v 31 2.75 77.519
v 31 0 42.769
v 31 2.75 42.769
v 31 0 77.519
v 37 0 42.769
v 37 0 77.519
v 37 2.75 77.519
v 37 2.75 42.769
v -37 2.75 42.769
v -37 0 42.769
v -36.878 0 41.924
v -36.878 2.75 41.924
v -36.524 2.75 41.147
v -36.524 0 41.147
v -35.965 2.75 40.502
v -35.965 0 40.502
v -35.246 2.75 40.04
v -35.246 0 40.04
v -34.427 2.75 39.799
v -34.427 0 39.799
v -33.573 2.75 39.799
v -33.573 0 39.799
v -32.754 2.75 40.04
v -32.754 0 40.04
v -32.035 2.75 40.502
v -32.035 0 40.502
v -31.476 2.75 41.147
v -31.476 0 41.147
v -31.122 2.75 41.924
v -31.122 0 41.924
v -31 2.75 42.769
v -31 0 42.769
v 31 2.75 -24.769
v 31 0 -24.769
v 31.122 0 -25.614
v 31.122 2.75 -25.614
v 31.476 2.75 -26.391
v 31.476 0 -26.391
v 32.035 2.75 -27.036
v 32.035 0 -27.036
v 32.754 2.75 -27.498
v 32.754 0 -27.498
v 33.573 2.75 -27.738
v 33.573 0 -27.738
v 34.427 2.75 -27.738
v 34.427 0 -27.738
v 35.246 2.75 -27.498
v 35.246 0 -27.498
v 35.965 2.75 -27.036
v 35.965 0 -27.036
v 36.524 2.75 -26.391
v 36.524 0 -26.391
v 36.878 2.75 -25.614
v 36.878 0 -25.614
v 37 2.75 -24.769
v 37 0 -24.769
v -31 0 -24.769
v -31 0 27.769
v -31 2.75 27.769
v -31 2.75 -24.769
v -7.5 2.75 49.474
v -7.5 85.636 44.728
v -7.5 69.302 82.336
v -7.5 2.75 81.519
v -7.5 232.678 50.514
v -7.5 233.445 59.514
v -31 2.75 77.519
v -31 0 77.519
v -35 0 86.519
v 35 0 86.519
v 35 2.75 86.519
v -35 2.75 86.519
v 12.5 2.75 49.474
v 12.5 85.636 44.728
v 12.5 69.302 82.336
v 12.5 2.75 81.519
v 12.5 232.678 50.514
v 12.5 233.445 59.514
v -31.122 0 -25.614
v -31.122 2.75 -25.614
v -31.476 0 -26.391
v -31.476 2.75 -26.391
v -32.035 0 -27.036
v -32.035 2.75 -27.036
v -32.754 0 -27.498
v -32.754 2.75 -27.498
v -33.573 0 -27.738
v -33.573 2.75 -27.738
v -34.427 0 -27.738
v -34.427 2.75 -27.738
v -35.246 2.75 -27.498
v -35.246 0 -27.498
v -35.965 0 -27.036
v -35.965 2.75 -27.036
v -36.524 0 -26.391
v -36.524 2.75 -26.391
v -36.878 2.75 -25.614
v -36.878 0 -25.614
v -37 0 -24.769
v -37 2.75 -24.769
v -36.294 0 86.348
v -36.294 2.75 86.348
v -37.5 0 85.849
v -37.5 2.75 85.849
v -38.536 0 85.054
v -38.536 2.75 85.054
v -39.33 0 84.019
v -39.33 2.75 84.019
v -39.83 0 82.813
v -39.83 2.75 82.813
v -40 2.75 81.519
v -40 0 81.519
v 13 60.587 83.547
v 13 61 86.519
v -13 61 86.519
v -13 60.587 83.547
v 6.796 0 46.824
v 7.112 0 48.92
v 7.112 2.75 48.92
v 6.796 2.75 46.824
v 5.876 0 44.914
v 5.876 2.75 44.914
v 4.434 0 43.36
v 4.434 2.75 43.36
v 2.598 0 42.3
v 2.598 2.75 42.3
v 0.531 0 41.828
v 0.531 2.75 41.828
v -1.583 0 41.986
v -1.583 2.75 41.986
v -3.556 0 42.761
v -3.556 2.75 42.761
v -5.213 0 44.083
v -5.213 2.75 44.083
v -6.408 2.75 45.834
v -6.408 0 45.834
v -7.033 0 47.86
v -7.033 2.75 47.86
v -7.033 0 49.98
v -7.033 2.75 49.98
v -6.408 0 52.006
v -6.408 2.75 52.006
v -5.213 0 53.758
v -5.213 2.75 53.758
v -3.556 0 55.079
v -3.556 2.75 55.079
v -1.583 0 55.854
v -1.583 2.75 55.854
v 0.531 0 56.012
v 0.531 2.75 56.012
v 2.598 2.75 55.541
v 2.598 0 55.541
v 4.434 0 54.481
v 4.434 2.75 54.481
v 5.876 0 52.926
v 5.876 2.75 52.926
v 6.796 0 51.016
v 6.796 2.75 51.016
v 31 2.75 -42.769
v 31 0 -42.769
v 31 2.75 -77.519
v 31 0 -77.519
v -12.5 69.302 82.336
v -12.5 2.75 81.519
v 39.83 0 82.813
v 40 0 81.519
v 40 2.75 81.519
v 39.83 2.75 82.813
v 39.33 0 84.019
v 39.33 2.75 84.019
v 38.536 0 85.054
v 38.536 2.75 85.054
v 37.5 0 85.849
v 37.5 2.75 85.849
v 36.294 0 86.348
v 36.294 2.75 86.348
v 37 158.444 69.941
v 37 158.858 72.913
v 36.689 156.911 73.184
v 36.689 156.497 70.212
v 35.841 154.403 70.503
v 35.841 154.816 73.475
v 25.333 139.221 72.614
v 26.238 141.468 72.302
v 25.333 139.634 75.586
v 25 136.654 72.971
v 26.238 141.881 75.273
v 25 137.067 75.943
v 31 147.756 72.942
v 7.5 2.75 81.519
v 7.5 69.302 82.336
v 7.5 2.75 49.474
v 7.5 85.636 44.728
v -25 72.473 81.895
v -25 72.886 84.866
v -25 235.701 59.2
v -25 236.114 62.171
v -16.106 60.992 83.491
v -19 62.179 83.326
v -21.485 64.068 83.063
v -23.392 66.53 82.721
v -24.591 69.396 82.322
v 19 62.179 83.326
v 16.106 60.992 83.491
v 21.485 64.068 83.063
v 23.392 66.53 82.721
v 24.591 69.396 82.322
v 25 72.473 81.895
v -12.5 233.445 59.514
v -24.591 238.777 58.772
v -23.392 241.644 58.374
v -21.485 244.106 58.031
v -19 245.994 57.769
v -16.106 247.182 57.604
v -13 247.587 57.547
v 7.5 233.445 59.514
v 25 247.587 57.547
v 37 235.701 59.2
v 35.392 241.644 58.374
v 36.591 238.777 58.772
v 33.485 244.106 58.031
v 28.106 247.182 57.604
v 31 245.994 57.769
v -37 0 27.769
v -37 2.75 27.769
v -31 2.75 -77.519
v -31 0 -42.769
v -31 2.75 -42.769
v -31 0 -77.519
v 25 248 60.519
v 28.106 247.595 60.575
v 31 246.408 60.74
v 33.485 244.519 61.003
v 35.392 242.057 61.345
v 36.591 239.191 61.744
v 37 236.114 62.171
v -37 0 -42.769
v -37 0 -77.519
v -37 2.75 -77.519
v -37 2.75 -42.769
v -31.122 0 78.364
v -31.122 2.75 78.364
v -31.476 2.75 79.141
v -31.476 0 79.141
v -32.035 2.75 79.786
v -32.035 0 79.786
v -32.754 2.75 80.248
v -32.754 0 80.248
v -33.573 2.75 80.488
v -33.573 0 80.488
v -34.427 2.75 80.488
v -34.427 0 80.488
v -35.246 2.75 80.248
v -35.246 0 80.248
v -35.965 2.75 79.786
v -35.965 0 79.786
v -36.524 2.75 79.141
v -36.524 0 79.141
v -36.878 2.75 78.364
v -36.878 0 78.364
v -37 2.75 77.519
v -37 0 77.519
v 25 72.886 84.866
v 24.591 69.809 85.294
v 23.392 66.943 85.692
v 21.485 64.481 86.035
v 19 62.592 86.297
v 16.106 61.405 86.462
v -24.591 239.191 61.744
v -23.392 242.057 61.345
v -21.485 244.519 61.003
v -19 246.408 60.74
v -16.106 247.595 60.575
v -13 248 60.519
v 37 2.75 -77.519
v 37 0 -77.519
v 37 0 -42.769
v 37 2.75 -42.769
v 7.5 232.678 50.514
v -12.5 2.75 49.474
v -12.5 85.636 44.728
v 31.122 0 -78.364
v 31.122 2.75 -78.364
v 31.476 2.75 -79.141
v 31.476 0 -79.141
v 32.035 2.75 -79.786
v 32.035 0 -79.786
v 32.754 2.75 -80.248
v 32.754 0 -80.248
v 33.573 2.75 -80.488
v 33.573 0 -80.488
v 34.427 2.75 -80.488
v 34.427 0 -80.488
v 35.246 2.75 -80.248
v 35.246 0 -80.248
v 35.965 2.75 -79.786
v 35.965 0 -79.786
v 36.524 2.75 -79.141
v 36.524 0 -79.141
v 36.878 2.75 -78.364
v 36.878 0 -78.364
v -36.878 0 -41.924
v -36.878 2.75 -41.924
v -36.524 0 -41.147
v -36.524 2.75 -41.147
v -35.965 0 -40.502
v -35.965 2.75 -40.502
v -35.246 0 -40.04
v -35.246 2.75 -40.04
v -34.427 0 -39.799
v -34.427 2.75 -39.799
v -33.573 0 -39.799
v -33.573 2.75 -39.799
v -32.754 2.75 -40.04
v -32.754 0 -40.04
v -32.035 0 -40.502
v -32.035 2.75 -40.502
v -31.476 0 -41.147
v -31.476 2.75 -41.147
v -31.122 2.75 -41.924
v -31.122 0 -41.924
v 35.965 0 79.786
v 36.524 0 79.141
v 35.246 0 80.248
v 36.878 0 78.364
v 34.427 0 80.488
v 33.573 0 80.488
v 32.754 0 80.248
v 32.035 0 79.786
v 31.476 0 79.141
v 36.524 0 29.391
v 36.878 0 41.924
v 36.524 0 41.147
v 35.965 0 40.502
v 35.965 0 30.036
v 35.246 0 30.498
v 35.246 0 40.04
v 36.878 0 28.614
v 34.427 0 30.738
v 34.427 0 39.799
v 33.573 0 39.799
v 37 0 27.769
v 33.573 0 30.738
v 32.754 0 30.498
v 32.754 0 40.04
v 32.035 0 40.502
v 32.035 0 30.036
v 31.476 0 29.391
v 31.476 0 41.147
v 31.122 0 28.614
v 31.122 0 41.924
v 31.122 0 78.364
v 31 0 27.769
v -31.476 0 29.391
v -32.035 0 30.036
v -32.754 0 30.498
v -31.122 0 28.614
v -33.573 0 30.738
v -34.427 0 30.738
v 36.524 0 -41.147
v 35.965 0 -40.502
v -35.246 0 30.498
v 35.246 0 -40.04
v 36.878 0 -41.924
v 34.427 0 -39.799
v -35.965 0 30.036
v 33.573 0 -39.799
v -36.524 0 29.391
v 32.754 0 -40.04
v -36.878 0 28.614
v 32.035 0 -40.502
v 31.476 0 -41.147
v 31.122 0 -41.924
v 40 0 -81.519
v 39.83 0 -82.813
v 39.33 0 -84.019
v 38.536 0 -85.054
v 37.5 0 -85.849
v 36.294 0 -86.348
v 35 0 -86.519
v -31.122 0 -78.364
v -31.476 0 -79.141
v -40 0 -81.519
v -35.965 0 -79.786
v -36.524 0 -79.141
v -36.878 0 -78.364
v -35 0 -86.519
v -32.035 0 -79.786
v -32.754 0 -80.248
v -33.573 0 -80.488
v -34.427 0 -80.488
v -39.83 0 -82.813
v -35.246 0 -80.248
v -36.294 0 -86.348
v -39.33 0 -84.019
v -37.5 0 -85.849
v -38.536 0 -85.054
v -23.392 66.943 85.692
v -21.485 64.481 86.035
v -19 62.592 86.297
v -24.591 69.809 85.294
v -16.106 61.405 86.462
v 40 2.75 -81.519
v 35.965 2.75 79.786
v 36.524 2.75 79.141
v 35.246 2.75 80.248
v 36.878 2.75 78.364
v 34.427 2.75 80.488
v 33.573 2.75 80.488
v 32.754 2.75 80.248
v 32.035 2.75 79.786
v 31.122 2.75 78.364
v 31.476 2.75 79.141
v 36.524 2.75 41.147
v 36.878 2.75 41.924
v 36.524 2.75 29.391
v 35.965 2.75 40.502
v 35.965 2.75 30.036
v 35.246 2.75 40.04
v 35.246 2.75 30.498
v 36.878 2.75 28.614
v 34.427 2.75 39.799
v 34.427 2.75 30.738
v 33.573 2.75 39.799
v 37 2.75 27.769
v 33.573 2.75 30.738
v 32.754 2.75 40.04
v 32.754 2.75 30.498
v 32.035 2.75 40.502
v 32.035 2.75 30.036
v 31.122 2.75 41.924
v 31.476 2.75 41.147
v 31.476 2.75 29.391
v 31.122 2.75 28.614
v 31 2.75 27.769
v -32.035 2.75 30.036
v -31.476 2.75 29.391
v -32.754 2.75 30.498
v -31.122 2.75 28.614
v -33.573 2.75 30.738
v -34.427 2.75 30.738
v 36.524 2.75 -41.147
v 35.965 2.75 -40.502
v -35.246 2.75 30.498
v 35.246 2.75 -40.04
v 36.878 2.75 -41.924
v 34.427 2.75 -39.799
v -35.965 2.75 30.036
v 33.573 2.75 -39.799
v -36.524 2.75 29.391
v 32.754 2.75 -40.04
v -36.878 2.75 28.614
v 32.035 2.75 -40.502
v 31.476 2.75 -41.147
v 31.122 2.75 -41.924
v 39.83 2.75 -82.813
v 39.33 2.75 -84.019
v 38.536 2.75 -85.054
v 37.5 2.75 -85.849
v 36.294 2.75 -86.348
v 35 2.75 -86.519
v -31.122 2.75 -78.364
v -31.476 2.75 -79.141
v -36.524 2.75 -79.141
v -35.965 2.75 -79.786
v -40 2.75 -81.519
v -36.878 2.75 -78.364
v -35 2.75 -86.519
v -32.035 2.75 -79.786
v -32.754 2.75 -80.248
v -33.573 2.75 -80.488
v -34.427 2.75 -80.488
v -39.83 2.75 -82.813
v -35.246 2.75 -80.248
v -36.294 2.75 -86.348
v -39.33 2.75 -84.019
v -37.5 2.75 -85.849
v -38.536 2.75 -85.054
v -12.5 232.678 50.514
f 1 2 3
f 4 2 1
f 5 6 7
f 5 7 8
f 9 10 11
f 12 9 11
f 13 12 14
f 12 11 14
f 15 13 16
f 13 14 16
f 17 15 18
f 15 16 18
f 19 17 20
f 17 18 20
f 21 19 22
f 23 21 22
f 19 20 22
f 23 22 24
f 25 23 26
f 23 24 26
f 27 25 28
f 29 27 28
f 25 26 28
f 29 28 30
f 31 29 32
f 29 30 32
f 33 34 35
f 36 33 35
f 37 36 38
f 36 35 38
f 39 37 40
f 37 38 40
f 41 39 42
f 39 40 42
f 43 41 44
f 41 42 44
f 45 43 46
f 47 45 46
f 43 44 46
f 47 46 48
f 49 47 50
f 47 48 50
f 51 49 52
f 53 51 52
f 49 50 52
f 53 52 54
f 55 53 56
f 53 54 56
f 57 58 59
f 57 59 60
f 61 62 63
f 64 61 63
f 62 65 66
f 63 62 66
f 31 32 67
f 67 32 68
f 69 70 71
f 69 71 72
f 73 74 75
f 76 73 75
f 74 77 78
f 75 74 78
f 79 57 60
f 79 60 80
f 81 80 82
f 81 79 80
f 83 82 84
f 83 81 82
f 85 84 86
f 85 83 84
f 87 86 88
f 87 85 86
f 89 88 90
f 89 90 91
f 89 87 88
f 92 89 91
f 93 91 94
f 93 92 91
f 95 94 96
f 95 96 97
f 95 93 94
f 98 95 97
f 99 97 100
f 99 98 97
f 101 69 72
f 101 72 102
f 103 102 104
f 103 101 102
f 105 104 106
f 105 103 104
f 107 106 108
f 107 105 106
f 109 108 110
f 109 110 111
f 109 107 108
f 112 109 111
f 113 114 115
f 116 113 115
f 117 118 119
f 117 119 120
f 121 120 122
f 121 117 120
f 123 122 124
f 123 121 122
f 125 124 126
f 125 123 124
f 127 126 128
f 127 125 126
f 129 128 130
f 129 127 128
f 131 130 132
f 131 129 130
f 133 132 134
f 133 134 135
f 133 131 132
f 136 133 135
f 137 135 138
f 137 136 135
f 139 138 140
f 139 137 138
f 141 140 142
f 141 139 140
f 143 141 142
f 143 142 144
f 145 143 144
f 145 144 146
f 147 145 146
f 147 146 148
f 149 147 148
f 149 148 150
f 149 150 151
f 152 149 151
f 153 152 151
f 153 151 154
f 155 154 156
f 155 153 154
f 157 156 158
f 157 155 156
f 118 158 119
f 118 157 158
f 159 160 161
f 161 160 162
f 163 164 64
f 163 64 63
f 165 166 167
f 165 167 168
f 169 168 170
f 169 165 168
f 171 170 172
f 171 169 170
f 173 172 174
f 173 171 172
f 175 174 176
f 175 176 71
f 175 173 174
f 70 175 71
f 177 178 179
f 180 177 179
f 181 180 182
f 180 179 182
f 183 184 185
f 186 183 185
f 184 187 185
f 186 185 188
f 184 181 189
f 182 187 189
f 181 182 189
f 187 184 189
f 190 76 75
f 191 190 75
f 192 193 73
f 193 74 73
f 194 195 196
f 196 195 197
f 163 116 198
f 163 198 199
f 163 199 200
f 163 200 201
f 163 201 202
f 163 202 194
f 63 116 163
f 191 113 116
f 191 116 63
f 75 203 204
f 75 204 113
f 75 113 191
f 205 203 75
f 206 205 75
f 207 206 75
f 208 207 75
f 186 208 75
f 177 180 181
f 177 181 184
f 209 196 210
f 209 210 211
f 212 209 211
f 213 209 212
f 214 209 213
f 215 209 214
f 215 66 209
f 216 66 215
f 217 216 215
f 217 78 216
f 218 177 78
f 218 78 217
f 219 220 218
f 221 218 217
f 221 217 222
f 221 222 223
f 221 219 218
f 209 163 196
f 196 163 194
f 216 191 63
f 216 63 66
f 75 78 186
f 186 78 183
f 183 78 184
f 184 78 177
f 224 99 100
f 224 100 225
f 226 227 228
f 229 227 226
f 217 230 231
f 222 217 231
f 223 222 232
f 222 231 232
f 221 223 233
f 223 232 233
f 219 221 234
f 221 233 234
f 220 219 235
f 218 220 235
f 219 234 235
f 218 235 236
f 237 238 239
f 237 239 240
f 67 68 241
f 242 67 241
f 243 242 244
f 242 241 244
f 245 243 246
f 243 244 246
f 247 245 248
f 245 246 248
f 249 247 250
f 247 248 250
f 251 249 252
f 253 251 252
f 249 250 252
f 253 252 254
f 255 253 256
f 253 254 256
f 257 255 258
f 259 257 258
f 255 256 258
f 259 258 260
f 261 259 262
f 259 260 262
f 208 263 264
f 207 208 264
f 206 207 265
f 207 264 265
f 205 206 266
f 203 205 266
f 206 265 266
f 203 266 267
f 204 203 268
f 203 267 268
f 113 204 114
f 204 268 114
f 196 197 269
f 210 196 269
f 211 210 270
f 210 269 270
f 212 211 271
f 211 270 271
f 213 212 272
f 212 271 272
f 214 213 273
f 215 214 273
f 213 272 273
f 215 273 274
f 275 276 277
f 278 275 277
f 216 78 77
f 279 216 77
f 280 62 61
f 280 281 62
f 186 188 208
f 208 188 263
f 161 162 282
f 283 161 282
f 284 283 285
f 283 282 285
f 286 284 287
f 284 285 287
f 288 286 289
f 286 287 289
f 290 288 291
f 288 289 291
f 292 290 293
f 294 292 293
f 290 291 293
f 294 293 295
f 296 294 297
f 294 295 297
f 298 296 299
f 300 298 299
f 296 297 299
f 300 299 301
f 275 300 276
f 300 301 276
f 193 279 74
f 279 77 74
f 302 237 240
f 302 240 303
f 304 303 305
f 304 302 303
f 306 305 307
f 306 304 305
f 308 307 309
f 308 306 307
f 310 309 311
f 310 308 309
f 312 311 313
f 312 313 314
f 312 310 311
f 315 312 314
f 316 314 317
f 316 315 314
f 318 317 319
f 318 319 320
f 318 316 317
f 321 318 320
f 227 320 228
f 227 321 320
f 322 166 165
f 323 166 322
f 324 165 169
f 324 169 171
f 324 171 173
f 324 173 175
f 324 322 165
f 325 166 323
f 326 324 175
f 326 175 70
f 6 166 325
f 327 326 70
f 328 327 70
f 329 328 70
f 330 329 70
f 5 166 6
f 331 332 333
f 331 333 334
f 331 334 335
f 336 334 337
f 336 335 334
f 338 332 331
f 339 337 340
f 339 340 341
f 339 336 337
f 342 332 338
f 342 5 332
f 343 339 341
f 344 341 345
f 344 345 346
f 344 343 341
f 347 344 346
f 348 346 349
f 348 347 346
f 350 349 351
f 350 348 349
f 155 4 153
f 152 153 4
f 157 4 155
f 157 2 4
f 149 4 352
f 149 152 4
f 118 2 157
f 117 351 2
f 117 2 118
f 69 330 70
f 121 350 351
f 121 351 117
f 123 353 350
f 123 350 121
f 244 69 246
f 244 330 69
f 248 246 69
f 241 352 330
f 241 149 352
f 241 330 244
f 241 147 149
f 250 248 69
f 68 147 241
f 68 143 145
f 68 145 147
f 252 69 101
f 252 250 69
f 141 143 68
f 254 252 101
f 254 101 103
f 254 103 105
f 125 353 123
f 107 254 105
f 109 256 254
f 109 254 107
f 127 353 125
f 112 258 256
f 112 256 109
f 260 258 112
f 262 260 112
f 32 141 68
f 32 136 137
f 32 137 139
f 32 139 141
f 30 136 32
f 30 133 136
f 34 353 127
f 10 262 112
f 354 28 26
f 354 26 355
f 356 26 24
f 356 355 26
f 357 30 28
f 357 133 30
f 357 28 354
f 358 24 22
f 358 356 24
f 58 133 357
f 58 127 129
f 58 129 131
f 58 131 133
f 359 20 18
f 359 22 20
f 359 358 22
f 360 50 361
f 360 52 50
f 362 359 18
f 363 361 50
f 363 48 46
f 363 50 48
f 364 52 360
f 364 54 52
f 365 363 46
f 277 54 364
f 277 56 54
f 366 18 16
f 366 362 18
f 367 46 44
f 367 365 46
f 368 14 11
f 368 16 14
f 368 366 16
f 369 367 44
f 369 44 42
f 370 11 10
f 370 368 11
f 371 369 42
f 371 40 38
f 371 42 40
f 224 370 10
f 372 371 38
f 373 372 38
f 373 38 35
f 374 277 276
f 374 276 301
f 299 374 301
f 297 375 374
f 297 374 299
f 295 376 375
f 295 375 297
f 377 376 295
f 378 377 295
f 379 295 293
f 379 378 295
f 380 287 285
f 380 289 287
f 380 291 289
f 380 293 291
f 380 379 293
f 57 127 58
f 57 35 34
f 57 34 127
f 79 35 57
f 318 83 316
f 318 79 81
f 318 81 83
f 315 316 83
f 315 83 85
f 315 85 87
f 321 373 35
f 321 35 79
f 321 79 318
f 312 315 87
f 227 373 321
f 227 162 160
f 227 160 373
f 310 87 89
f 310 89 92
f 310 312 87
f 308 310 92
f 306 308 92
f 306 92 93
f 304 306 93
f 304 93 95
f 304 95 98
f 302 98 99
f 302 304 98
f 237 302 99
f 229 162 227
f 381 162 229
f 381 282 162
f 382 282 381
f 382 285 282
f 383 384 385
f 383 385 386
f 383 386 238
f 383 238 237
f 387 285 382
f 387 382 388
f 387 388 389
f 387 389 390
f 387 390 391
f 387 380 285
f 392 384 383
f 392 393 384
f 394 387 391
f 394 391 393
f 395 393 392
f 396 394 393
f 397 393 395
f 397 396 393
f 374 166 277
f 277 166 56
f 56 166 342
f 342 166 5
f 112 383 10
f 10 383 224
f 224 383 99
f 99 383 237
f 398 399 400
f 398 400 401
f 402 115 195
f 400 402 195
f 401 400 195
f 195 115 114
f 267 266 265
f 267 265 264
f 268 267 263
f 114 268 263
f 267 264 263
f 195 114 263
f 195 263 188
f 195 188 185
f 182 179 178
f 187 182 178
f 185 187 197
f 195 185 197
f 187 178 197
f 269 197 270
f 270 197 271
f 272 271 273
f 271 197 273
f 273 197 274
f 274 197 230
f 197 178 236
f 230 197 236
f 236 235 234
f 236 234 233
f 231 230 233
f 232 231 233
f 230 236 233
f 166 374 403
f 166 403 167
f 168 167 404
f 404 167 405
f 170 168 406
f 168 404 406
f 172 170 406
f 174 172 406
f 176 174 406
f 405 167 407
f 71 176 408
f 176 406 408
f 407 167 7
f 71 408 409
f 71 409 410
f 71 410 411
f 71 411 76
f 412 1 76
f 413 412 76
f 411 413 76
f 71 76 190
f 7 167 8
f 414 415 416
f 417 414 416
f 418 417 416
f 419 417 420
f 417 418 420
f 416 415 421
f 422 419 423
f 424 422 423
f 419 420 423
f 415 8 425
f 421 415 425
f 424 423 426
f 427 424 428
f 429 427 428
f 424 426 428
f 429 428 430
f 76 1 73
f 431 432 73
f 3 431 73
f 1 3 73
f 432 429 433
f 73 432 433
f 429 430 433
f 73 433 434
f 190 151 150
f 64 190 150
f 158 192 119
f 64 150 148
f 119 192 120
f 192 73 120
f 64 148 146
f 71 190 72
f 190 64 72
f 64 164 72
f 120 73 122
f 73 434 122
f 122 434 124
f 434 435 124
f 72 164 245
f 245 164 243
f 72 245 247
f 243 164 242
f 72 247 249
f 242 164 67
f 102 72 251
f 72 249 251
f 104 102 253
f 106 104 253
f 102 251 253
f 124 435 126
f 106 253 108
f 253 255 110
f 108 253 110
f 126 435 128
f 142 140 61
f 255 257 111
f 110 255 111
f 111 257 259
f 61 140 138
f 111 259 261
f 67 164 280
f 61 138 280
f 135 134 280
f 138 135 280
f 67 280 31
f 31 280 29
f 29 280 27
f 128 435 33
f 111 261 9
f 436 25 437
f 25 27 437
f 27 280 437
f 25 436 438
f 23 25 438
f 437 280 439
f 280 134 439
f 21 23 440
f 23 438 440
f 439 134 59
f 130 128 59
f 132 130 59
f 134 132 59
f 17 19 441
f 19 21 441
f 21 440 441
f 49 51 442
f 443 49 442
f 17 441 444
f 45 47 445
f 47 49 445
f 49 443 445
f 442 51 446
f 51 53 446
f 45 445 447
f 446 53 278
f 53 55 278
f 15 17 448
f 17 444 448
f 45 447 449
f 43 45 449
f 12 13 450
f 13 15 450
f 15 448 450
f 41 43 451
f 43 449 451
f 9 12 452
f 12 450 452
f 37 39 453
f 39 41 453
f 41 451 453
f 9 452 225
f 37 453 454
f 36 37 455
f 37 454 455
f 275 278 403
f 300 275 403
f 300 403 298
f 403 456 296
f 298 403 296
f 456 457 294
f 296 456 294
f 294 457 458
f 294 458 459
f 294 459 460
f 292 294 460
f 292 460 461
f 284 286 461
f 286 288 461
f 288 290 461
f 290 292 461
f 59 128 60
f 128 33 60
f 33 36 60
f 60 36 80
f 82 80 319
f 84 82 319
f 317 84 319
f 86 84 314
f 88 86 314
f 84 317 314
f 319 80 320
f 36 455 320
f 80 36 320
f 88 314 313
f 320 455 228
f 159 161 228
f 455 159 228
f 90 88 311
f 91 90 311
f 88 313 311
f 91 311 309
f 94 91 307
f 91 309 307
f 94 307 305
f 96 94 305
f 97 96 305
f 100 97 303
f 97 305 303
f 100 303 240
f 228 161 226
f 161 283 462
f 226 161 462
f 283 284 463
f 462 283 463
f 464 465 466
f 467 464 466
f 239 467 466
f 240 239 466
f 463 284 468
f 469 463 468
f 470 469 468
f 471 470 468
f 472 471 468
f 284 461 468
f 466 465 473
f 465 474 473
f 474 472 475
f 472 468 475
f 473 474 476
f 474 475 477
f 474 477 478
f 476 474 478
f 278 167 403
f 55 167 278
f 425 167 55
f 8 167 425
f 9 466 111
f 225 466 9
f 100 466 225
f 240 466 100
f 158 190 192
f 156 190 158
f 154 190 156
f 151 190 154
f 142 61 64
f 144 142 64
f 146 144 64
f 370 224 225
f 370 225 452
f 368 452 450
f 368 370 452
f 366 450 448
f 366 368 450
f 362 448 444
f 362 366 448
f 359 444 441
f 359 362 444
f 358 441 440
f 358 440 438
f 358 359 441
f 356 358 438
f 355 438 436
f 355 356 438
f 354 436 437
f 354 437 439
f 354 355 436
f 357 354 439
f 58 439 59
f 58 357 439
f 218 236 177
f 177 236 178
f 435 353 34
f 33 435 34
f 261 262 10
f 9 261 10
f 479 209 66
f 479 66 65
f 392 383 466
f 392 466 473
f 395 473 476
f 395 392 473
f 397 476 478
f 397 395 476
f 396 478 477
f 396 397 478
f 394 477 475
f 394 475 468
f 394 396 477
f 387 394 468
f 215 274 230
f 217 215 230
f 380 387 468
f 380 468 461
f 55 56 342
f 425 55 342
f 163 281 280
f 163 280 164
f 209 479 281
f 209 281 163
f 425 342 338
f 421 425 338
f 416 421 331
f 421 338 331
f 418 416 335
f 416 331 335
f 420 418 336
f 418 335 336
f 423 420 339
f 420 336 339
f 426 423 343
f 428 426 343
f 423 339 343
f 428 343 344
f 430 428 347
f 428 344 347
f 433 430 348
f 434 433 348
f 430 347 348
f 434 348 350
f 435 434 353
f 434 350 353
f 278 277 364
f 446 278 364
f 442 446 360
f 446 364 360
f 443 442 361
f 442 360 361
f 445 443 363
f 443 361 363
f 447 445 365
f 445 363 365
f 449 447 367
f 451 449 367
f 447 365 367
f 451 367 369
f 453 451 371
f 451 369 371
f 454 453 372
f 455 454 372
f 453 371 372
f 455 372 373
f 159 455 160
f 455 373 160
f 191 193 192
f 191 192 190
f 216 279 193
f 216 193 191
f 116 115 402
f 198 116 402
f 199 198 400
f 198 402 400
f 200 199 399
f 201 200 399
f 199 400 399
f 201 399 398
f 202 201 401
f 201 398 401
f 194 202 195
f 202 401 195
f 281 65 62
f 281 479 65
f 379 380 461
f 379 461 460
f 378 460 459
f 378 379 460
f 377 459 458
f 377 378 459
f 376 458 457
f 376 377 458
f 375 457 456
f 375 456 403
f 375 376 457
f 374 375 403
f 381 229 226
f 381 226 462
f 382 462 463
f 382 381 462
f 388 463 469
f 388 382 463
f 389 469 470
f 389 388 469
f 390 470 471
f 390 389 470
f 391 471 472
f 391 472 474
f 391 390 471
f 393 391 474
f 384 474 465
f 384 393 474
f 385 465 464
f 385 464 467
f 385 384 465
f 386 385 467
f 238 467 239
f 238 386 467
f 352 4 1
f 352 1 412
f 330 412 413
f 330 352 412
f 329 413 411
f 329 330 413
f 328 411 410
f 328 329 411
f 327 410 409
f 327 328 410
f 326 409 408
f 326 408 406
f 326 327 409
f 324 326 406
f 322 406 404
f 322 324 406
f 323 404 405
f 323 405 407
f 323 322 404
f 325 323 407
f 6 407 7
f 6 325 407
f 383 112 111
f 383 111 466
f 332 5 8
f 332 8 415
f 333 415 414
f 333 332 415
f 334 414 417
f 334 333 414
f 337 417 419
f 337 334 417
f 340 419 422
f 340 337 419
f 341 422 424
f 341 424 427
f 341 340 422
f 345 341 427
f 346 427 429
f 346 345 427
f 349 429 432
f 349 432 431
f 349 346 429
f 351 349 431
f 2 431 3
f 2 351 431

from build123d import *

# Parameters (mm, degrees)
SKETCH1_R           = 7.112045721
BOSS_EXTRUDE1_DEPTH = 2.75
BOSS_EXTRUDE2_DEPTH = 3
BOSS_EXTRUDE3_DEPTH = 2.5


with BuildPart() as part:
    # Sketch1 → Boss-Extrude1 (new body)
    with BuildSketch(Plane(origin=(0, 0, 0), x_dir=(1, 0, 0), z_dir=(0, 1, 0))):
        with BuildLine():
            Line((-35, 86.51875), (35, 86.51875))
            ThreePointArc((35, 86.51875), (38.535533906, 85.054283906), (40, 81.51875))
            Line((40, 81.51875), (40, -81.51875))
            ThreePointArc((40, -81.51875), (38.535533906, -85.054283906), (35, -86.51875))
            Line((35, -86.51875), (-35, -86.51875))
            ThreePointArc((-35, -86.51875), (-38.535533906, -85.054283906), (-40, -81.51875))
            Line((-40, -81.51875), (-40, 81.51875))
            ThreePointArc((-40, 81.51875), (-38.535533906, 85.054283906), (-35, 86.51875))
        make_face()
        with Locations((0, -48.920084539)):
            Circle(SKETCH1_R, mode=Mode.SUBTRACT)
        with BuildLine():
            Line((37, 77.51875), (37, 42.76875))
            ThreePointArc((37, 42.76875), (34, 39.76875), (31, 42.76875))
            Line((31, 42.76875), (31, 77.51875))
            ThreePointArc((31, 77.51875), (34, 80.51875), (37, 77.51875))
        make_face(mode=Mode.SUBTRACT)
        with BuildLine():
            Line((-37, 77.51875), (-37, 42.76875))
            ThreePointArc((-37, 42.76875), (-34, 39.76875), (-31, 42.76875))
            Line((-31, 42.76875), (-31, 77.51875))
            ThreePointArc((-31, 77.51875), (-34, 80.51875), (-37, 77.51875))
        make_face(mode=Mode.SUBTRACT)
        with BuildLine():
            Line((37, -77.51875), (37, -42.76875))
            ThreePointArc((37, -42.76875), (34, -39.76875), (31, -42.76875))
            Line((31, -42.76875), (31, -77.51875))
            ThreePointArc((31, -77.51875), (34, -80.51875), (37, -77.51875))
        make_face(mode=Mode.SUBTRACT)
        with BuildLine():
            Line((-37, -77.51875), (-37, -42.76875))
            ThreePointArc((-37, -42.76875), (-34, -39.76875), (-31, -42.76875))
            Line((-31, -42.76875), (-31, -77.51875))
            ThreePointArc((-31, -77.51875), (-34, -80.51875), (-37, -77.51875))
        make_face(mode=Mode.SUBTRACT)
        with BuildLine():
            Line((37, 24.76875), (37, -27.76875))
            ThreePointArc((37, -27.76875), (34, -30.76875), (31, -27.76875))
            Line((31, -27.76875), (31, 24.76875))
            ThreePointArc((31, 24.76875), (34, 27.76875), (37, 24.76875))
        make_face(mode=Mode.SUBTRACT)
        with BuildLine():
            Line((-37, 24.76875), (-37, -27.76875))
            ThreePointArc((-37, -27.76875), (-34, -30.76875), (-31, -27.76875))
            Line((-31, -27.76875), (-31, 24.76875))
            ThreePointArc((-31, 24.76875), (-34, 27.76875), (-37, 24.76875))
        make_face(mode=Mode.SUBTRACT)
    extrude(amount=BOSS_EXTRUDE1_DEPTH)



with BuildPart() as body_2:
    # Sketch3 → Boss-Extrude2 (new body)
    with BuildSketch(Plane(origin=(0, 12.958063193, 93.198377578), x_dir=(0, -0.990472215, 0.137712714), z_dir=(0, 0.137712714, 0.990472215))):
        with BuildLine():
            Line((-125.30290794, 25), (-60.504073198, 25))
            ThreePointArc((-60.504073198, 25), (-52.018791824, 21.485281374), (-48.504073198, 13))
            Line((-48.504073198, 13), (-48.504073198, -13))
            ThreePointArc((-48.504073198, -13), (-52.018791824, -21.485281374), (-60.504073198, -25))
            Line((-60.504073198, -25), (-225.30290794, -25))
            ThreePointArc((-225.30290794, -25), (-233.788189314, -21.485281374), (-237.30290794, -13))
            Line((-237.30290794, -13), (-237.30290794, 25))
            ThreePointArc((-237.30290794, 25), (-233.788189314, 33.485281374), (-225.30290794, 37))
            Line((-225.30290794, 37), (-147.30290794, 37))
            add(Edge.make_bspline(
                [(-147.30290794, 37), (-144.065512893, 37), (-135.5827842, 31), (-129.980550468, 25), (-125.30290794, 25)],
                knots=[0, 0, 0, 0, 0.5, 1, 1, 1, 1], degree=3))
        make_face()
    extrude(amount=-BOSS_EXTRUDE2_DEPTH)


with BuildPart() as part_1:
    add(part.part)

    add(body_2.part)  # Boss-Extrude3 merges body 2
    # Sketch4 → Boss-Extrude3 (add, symmetric)
    with BuildSketch(Plane(origin=(10, 0, 0), x_dir=(0, 0, -1), z_dir=(1, 0, 0))):
        Polygon((-59.513534896, 233.445335393), (-50.513534896, 232.678056605), (-44.72786756, 85.636126776), (-49.474356372, 2.75), (-81.51875, 2.75), (-82.335595034, 69.302056709), align=None)
    boss_extrude3 = extrude(amount=BOSS_EXTRUDE3_DEPTH, both=True)

    # Mirror1: Boss-Extrude3 across plane
    add(boss_extrude3.mirror(Plane(origin=(0, 0, 0), x_dir=(0, 0, 1), z_dir=(1, 0, 0))))


solid = part_1.part
